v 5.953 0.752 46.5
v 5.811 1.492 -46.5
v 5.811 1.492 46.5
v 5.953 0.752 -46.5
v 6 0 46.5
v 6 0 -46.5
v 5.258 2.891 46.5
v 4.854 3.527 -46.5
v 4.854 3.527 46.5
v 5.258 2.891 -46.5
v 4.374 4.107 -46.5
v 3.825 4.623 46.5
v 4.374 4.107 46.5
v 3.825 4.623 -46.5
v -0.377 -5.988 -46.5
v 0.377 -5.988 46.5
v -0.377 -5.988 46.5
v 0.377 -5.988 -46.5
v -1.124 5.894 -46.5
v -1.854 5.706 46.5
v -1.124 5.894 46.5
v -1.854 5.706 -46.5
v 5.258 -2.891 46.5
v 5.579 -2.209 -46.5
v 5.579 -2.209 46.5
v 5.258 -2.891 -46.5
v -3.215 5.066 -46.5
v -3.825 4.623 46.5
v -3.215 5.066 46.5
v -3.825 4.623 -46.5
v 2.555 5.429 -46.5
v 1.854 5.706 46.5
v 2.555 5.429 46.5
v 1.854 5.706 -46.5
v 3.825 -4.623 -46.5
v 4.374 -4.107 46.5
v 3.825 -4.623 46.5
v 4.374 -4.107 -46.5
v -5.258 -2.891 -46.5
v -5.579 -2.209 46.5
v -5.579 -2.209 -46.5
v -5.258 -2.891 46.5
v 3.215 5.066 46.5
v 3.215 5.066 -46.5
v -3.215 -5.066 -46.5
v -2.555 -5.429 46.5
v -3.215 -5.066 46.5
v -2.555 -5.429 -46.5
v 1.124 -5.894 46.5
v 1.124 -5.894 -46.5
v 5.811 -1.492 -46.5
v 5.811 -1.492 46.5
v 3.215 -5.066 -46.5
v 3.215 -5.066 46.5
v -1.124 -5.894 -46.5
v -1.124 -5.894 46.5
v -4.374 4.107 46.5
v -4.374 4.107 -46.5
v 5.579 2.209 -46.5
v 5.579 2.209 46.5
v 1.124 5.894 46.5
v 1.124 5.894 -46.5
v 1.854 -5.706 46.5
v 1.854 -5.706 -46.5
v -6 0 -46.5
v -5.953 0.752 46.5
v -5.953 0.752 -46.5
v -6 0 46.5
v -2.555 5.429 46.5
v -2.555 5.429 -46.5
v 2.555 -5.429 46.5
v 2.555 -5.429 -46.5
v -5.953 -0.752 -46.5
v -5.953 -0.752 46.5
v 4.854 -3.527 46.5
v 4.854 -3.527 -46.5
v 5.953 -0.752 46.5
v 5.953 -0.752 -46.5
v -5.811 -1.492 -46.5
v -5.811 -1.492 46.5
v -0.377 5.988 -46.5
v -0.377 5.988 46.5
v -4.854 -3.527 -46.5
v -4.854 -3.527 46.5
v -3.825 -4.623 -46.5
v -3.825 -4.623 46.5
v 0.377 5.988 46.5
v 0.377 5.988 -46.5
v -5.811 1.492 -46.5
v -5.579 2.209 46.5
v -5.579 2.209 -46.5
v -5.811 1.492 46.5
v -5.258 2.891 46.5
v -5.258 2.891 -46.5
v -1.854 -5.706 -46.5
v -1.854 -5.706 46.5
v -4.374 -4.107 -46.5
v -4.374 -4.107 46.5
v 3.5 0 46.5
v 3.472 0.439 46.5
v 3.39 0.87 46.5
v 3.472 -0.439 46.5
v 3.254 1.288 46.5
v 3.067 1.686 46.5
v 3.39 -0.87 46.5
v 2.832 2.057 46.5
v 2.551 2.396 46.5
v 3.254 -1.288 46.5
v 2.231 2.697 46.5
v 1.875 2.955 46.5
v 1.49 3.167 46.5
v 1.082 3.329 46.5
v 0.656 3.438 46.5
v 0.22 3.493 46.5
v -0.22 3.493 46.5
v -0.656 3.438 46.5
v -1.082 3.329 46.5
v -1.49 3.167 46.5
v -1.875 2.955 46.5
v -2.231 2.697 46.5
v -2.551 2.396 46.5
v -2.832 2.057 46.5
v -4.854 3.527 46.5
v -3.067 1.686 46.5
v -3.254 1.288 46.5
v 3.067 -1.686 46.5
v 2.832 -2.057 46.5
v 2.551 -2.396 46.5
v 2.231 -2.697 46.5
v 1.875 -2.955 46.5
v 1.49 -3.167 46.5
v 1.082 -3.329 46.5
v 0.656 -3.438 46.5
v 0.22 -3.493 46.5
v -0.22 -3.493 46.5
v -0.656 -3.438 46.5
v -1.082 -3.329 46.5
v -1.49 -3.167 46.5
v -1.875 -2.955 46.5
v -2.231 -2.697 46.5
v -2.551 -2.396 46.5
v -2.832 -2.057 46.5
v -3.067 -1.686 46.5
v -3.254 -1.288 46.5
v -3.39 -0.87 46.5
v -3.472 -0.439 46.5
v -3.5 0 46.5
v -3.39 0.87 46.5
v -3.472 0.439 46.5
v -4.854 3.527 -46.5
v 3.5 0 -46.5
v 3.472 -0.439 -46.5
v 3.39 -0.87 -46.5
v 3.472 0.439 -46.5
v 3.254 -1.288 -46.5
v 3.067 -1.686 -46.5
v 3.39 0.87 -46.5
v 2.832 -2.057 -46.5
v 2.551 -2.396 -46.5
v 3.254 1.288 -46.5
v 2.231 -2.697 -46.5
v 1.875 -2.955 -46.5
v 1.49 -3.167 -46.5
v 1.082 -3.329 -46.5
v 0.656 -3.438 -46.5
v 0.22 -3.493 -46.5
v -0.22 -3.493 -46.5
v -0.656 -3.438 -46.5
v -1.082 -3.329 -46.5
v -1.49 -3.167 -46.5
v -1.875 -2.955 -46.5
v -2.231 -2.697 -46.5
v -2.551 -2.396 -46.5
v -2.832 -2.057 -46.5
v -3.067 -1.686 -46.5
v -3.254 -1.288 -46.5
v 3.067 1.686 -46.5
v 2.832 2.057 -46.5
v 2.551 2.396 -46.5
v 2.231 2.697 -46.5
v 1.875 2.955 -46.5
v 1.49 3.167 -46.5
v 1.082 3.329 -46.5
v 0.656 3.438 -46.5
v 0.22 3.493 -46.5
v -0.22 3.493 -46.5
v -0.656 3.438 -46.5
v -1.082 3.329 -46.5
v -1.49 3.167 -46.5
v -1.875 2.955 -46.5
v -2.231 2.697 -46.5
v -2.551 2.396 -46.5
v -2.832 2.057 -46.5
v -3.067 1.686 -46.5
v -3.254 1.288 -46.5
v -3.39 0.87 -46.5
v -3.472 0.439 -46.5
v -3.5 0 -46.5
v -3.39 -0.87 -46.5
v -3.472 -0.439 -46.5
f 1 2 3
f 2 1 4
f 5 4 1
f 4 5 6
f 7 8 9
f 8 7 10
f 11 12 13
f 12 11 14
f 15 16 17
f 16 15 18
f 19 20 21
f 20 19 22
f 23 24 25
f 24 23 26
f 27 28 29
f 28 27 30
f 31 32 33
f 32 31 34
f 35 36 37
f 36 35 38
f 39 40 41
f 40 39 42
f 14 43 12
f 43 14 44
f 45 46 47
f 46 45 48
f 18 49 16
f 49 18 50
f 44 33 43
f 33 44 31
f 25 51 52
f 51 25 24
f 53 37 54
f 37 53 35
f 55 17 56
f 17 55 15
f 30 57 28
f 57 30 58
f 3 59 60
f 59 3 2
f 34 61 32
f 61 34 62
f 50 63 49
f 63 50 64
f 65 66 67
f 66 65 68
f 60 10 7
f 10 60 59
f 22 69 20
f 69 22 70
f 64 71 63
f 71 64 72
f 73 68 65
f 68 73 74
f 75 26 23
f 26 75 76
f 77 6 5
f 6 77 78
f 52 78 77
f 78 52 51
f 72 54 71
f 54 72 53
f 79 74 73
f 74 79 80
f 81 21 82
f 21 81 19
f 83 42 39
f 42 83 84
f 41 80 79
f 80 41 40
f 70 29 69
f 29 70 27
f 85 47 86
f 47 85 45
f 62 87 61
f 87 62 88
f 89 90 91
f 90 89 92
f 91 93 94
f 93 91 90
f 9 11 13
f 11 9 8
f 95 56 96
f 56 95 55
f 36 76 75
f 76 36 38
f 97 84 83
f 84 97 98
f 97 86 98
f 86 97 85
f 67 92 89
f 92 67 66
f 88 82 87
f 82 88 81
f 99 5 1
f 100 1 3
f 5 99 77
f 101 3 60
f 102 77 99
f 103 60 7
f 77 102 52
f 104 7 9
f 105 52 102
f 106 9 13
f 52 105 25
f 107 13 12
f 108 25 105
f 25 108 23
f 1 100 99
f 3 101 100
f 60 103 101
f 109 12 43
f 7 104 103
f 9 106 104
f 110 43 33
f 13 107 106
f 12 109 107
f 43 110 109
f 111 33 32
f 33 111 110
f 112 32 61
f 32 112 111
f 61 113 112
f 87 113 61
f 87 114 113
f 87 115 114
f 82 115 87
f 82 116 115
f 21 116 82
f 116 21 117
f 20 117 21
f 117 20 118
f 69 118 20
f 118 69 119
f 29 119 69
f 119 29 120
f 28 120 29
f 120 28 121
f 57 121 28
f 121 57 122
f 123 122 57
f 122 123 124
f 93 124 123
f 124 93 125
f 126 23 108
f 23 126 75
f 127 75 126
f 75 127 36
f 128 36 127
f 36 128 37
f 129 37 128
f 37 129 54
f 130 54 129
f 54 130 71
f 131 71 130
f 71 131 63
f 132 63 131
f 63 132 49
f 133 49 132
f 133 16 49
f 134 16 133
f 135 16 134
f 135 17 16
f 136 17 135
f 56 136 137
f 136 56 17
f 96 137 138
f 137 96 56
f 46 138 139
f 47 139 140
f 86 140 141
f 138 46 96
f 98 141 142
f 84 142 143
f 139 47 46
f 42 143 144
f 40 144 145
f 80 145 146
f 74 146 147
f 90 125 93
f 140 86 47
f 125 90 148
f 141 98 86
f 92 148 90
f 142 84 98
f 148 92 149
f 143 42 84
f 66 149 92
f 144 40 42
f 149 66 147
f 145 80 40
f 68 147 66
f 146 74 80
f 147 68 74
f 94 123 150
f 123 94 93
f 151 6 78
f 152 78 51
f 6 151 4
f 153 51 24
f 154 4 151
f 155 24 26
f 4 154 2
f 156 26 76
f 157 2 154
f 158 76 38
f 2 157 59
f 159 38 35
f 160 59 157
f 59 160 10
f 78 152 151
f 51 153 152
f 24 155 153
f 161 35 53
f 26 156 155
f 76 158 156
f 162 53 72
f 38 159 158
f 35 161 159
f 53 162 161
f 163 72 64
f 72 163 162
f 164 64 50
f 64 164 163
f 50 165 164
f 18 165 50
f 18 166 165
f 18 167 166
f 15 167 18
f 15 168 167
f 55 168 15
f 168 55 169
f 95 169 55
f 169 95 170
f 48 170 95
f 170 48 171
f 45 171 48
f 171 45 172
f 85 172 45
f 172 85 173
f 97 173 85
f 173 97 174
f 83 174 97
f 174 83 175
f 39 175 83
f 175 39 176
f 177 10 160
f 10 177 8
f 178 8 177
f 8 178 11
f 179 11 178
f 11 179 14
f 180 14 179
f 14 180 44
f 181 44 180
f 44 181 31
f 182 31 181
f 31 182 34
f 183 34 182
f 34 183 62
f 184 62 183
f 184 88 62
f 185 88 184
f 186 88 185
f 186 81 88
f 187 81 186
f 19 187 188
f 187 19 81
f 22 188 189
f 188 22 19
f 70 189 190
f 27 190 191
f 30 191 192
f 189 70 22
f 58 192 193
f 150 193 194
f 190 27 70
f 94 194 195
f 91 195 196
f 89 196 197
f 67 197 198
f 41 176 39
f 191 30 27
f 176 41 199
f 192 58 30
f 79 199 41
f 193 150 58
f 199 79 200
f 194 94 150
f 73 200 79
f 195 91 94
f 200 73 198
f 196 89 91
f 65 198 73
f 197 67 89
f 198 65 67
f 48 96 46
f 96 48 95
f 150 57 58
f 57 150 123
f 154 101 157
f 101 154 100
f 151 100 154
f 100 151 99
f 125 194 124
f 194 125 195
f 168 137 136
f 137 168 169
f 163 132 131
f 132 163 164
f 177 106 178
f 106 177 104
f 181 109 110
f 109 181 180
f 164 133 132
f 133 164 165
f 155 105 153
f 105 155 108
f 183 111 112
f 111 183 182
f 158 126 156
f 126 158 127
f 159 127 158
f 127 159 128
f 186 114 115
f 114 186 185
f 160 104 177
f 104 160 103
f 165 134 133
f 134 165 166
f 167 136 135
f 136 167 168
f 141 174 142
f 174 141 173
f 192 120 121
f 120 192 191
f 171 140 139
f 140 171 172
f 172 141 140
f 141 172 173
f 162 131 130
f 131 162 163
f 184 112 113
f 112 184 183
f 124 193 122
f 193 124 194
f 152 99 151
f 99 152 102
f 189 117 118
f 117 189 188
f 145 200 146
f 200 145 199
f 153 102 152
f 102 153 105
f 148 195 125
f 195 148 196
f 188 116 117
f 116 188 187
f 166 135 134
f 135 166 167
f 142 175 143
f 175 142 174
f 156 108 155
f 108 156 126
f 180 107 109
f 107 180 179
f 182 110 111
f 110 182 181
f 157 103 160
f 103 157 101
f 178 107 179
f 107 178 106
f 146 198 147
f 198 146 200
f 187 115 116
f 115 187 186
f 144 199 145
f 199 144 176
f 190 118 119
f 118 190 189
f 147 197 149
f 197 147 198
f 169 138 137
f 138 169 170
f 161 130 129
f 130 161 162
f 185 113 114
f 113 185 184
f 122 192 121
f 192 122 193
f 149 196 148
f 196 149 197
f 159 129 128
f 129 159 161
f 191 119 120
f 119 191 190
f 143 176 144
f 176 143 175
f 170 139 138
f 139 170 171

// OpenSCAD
$fn = 50;


difference() {
	union() {
		translate(v = [0, 0, -46.5000000000]) {
			cylinder(h = 93, r = 6.0000000000);
		}
	}
	union() {
		translate(v = [0, 0, -100.0000000000]) {
			cylinder(h = 200, r = 3.5000000000);
		}
	}
}
